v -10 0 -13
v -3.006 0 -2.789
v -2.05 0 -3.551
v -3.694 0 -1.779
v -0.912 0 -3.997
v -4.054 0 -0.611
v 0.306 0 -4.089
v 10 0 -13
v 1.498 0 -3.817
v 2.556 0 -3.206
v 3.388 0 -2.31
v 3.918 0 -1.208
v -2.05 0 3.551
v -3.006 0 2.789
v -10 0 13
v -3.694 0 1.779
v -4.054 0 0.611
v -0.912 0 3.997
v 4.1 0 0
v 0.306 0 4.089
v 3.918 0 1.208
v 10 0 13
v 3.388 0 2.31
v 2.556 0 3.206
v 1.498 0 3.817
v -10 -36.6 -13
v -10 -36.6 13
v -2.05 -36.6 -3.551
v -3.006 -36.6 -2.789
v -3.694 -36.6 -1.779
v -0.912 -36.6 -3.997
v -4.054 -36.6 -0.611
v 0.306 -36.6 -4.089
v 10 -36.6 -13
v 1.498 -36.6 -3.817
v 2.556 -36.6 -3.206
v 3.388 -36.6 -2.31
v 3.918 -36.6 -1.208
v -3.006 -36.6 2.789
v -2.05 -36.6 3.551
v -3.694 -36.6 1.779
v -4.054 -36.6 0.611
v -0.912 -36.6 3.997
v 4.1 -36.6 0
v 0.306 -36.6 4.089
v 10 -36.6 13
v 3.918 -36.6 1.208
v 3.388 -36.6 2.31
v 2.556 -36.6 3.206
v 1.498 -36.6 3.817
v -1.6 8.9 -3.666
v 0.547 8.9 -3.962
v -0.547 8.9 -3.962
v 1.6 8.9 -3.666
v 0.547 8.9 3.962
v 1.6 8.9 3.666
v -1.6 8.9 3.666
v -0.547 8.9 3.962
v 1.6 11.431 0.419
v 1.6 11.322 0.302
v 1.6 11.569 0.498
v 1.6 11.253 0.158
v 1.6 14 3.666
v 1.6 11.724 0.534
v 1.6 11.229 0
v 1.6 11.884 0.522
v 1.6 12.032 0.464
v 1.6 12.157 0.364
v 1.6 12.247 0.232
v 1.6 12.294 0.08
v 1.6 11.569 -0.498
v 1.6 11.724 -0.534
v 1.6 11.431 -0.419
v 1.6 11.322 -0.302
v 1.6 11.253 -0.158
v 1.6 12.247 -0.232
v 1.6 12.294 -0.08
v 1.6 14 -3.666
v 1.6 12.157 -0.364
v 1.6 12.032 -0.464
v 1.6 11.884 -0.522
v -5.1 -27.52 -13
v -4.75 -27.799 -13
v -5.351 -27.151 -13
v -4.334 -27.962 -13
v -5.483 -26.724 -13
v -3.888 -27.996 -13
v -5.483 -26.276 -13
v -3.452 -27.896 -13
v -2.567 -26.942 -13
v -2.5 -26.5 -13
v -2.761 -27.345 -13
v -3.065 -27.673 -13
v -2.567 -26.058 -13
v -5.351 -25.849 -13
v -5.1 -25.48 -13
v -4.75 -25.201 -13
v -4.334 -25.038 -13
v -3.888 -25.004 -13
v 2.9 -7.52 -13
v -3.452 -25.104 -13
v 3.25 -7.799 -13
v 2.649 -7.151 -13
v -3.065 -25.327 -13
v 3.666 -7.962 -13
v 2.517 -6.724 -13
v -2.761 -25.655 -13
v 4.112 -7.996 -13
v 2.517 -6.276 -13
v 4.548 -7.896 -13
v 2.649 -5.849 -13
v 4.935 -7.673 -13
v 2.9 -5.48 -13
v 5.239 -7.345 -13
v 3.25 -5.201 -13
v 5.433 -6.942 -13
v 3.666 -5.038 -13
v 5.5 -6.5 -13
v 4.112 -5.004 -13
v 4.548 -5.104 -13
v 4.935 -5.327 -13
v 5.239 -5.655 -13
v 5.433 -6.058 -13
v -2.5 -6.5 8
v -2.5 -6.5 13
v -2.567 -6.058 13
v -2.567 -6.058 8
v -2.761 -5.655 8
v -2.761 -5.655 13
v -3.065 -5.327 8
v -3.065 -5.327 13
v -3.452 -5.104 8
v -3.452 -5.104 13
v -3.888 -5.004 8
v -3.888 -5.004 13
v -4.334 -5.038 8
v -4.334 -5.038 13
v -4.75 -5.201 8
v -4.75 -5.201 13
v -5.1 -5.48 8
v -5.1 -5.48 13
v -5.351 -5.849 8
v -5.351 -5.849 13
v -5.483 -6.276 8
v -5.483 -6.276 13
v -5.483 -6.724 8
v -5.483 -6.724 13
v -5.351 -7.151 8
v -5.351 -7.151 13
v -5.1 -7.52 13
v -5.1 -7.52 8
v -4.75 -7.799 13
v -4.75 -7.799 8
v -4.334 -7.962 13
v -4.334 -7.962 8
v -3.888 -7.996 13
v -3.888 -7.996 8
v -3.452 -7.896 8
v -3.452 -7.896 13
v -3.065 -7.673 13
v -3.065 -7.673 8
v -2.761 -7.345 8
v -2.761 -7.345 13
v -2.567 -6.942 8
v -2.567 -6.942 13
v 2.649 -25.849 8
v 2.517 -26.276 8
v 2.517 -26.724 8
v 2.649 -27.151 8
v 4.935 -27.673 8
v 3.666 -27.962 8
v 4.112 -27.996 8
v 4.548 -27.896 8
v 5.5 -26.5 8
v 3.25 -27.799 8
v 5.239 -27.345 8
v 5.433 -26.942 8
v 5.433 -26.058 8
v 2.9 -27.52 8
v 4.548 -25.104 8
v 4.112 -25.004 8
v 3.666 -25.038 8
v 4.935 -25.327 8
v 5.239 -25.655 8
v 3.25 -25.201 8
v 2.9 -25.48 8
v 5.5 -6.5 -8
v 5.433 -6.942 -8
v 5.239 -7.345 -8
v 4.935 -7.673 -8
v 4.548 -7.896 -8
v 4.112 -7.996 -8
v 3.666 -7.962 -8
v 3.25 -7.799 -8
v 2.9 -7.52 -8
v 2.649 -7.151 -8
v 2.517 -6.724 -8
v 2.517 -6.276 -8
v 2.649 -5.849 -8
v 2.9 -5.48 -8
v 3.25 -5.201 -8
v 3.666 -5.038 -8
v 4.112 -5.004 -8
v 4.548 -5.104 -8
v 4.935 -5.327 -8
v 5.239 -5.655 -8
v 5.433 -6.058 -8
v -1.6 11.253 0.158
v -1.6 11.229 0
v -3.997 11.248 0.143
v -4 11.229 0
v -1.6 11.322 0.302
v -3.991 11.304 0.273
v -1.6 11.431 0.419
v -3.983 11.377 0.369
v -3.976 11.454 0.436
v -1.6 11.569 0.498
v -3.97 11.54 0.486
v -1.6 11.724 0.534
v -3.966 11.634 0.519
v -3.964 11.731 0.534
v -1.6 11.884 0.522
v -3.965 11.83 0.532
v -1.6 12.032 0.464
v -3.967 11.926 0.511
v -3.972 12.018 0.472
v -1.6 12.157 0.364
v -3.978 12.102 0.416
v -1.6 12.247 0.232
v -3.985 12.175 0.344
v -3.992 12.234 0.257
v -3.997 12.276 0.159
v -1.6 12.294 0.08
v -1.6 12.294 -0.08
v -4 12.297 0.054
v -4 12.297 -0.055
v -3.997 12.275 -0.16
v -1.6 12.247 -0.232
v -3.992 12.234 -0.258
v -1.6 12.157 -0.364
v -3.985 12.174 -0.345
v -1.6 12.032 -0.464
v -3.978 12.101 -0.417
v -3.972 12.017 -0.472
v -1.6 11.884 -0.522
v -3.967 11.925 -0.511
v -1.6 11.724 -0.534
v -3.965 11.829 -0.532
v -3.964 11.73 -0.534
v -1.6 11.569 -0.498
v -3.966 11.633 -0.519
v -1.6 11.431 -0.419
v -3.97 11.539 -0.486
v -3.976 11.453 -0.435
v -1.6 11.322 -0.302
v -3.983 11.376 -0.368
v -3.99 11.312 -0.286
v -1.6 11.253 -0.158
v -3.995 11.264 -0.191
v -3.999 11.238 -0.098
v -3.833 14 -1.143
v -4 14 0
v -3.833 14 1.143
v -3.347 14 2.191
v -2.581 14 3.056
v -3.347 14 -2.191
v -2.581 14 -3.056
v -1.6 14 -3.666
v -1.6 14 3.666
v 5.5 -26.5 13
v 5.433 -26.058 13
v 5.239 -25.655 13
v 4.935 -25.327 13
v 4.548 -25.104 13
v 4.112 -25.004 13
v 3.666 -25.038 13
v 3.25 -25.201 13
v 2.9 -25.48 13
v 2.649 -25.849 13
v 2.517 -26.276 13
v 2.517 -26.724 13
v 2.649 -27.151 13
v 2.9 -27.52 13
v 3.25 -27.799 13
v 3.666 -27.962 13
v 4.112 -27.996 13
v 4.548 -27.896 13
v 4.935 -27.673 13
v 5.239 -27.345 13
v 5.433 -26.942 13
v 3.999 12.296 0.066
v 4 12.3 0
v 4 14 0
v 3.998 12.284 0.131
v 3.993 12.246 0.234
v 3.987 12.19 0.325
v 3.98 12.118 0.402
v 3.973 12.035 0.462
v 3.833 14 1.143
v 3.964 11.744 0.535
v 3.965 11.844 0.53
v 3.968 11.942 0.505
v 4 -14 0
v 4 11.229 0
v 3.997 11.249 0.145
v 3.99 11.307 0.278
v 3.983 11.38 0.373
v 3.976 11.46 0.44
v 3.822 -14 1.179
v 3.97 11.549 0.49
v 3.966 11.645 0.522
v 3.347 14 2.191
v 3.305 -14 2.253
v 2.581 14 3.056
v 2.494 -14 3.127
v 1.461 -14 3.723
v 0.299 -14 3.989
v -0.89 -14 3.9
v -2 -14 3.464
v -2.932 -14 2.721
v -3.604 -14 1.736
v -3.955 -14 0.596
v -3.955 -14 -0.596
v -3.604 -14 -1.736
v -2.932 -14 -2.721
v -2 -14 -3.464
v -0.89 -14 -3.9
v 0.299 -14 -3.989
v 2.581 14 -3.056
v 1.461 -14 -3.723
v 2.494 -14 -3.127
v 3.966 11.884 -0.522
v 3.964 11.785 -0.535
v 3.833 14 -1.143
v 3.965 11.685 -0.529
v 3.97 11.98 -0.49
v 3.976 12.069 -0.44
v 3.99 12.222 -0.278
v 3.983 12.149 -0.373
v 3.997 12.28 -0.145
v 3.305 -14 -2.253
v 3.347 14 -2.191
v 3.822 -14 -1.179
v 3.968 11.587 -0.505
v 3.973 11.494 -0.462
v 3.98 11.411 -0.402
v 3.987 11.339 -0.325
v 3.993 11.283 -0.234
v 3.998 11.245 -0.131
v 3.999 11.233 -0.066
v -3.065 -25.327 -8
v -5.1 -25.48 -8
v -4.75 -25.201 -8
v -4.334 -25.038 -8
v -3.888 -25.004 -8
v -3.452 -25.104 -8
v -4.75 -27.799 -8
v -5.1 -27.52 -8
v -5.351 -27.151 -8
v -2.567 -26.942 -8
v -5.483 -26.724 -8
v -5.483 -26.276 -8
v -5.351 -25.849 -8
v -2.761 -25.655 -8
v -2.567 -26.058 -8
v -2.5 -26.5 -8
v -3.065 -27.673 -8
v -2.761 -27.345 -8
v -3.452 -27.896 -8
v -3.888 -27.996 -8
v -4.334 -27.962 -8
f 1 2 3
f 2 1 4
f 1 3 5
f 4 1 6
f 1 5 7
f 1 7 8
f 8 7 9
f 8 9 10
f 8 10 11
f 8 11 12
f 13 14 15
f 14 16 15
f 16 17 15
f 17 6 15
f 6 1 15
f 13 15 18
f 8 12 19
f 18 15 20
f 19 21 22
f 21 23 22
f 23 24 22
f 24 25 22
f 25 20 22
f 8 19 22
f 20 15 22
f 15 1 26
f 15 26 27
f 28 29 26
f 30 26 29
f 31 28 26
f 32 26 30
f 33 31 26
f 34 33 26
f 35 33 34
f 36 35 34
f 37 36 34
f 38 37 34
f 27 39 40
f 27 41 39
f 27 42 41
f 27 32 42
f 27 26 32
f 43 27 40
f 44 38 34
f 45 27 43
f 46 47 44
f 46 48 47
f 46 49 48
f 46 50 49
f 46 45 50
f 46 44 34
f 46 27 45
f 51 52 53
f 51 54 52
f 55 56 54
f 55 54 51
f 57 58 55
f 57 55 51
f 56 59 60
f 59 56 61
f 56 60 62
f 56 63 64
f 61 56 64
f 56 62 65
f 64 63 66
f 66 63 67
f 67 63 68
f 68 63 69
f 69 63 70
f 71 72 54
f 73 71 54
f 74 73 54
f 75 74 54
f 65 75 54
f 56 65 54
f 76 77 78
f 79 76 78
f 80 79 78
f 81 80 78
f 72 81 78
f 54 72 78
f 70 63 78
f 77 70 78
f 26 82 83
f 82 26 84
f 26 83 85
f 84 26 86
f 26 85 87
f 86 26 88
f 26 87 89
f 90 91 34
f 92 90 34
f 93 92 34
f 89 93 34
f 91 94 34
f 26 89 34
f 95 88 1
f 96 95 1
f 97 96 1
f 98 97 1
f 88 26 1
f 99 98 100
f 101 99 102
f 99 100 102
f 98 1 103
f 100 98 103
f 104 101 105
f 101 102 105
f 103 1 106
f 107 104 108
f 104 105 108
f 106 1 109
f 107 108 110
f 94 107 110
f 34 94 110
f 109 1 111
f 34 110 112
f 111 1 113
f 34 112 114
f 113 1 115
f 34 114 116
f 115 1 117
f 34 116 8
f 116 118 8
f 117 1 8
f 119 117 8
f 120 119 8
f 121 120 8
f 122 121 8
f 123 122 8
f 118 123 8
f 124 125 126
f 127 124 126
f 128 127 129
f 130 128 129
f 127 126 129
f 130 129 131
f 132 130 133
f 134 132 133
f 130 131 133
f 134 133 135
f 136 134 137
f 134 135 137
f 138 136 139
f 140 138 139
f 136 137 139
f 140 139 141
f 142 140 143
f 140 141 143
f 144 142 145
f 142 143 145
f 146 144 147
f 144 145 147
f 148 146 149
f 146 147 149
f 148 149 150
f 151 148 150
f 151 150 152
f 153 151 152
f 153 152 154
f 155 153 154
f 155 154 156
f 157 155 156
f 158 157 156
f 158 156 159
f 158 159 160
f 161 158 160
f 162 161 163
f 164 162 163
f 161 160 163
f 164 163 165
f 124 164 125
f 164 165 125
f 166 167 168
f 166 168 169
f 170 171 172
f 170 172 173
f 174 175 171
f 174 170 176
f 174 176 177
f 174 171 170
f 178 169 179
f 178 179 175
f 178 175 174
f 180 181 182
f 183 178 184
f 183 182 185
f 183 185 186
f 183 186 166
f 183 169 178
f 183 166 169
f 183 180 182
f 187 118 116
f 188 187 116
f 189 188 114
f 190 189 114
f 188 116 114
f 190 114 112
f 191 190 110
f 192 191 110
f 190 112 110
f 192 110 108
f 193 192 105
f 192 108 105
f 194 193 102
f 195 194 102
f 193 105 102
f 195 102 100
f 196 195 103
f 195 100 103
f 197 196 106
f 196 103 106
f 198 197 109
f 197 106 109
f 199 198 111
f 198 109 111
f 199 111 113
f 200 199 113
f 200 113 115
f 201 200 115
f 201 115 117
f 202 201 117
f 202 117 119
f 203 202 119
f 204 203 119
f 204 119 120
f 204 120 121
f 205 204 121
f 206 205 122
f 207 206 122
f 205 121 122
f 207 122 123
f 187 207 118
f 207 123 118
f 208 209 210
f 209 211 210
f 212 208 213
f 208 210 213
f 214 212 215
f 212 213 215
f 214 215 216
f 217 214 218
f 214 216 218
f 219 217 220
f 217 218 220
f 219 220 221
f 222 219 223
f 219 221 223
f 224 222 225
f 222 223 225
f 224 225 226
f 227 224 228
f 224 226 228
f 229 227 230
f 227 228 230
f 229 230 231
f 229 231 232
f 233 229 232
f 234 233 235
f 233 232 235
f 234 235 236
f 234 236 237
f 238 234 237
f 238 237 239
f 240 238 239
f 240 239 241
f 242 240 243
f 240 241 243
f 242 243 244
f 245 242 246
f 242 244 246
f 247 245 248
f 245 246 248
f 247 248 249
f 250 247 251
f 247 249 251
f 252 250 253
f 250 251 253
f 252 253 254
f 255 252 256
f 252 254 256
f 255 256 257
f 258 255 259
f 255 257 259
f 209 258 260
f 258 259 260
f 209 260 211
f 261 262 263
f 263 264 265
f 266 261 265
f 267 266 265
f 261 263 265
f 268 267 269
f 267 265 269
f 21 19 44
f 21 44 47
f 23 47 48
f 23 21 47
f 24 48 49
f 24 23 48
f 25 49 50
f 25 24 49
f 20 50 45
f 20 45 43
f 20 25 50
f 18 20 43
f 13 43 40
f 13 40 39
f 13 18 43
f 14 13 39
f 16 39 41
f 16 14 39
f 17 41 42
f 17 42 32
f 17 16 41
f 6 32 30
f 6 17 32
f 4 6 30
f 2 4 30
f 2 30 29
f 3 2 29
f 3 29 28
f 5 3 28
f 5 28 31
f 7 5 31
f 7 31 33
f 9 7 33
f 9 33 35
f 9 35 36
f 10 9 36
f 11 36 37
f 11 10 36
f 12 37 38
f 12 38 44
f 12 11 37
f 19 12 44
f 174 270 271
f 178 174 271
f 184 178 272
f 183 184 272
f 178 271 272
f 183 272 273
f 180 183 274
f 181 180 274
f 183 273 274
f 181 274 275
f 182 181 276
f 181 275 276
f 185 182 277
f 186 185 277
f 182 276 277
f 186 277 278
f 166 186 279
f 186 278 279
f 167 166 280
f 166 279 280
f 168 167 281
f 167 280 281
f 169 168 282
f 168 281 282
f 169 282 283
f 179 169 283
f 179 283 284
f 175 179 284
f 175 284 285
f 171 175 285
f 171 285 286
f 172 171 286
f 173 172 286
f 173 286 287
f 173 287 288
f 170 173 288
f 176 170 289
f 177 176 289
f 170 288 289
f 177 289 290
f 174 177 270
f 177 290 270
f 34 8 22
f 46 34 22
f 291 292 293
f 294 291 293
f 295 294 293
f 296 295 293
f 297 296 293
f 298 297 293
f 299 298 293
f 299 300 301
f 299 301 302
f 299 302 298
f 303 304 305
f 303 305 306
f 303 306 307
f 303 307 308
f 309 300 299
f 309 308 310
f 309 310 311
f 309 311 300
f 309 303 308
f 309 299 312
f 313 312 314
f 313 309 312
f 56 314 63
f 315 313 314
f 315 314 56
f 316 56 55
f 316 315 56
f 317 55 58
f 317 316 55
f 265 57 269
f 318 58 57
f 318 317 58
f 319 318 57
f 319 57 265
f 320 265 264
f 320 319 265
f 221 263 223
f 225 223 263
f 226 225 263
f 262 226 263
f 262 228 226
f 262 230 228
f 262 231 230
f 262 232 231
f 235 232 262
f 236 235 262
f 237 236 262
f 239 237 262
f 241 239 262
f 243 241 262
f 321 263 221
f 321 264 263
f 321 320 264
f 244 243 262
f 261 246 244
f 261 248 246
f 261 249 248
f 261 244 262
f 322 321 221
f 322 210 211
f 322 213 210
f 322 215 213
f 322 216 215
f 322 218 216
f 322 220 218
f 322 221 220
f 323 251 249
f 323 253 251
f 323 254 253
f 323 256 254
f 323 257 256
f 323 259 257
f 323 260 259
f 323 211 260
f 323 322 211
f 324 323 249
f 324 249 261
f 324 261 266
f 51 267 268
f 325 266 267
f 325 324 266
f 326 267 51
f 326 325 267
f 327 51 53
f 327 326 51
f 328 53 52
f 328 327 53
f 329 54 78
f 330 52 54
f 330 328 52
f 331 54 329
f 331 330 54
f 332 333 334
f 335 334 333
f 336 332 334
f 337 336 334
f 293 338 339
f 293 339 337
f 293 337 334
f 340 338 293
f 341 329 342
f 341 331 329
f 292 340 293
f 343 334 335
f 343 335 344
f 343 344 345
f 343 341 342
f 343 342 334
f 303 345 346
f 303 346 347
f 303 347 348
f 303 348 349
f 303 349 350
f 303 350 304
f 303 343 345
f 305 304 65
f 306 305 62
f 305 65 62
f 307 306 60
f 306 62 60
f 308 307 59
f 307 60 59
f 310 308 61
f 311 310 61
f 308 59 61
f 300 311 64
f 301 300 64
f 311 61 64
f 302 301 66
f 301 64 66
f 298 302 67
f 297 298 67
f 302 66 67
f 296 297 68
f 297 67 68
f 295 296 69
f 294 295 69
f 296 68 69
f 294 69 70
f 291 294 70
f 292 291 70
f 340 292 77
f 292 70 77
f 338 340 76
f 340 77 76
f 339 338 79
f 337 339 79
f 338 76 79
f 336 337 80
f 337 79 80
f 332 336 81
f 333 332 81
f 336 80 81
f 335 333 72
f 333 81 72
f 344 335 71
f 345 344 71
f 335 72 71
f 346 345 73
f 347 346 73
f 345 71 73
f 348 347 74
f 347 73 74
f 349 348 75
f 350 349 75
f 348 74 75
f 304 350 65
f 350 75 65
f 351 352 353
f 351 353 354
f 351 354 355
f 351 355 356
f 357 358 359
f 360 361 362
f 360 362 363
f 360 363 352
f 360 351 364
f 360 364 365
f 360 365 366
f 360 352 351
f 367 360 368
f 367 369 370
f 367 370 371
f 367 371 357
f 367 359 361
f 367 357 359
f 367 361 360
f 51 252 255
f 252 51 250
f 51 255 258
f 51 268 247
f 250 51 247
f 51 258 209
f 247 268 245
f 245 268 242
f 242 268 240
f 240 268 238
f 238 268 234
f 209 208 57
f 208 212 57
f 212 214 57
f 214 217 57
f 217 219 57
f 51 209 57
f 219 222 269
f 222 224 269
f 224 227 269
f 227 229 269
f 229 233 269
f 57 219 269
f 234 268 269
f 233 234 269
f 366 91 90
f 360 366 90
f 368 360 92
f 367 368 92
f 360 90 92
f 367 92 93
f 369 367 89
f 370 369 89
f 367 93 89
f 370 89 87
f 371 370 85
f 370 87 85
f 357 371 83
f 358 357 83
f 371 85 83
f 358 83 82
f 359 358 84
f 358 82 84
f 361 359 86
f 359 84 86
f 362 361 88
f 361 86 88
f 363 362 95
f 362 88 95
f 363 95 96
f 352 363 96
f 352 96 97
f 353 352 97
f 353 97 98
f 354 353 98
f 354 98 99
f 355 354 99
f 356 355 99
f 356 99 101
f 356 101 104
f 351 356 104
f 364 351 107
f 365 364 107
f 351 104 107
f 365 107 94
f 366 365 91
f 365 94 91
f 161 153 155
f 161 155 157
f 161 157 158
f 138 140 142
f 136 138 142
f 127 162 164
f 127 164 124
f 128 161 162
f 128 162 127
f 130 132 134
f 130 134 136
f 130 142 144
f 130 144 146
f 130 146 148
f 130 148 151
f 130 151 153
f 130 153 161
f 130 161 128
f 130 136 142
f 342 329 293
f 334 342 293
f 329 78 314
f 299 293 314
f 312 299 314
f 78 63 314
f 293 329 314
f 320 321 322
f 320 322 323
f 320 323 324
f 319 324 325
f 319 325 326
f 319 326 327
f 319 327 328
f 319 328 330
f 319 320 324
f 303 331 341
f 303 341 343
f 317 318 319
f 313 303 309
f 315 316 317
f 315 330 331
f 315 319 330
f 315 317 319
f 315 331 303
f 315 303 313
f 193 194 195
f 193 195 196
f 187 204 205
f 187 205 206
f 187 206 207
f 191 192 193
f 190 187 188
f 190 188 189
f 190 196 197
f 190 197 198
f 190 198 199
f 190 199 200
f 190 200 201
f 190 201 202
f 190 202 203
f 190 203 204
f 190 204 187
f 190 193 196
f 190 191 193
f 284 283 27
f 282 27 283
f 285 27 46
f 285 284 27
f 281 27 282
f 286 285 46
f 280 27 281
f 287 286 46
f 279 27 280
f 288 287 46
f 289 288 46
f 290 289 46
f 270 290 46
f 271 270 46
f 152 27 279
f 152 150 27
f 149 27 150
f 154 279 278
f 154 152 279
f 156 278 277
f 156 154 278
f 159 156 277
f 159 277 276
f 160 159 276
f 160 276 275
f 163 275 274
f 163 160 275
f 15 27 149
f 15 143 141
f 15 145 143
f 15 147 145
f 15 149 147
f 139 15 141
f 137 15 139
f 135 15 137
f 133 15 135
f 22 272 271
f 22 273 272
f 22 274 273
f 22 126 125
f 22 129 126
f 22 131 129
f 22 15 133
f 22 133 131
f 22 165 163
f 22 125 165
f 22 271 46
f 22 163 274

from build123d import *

# Parameters (mm, degrees)
F0_W      = 20
F0_H      = 26
F0_R      = 4.1
F1_DEPTH  = 36.6
F0_R_2    = 4
F2_DEPTH  = 14
F3_R      = 1.5
F4_DEPTH  = 5
F5_R      = 1.5
F6_DEPTH  = 5
F8_DEPTH  = 5.1
F9_R      = 0.53549
F10_DEPTH = 12.5


with BuildPart() as f1:
    # F0 (on Front) → F1 (new body)
    with BuildSketch(Plane.XZ):
        Rectangle(F0_W, F0_H)
        Circle(F0_R, mode=Mode.SUBTRACT)
    extrude(amount=F1_DEPTH)

    # F3 (on face) → F4 (cut)
    with BuildSketch(Plane.XY.offset(13)):
        with Locations((-4, -6.5)):
            Circle(F3_R)
        with Locations((4, -26.5)):
            Circle(F3_R)
    extrude(amount=-F4_DEPTH, mode=Mode.SUBTRACT)

    # F5 (on face) → F6 (cut)
    with BuildSketch(Plane(origin=(0, 0, -13), x_dir=(1, 0, 0), z_dir=(0, 0, -1))):
        with Locations((-4, 26.5)):
            Circle(F5_R)
        with Locations((4, 6.5)):
            Circle(F5_R)
    extrude(amount=-F6_DEPTH, mode=Mode.SUBTRACT)


with BuildPart() as f2:
    # F0 (on Front) → F2 (new body, symmetric)
    with BuildSketch(Plane.XZ):
        Circle(F0_R_2)
    extrude(amount=F2_DEPTH, both=True)

    # F7 (on face) → F8 (cut)
    with BuildSketch(Plane(origin=(0, 14, 0), x_dir=(-1, 0, 0), z_dir=(0, 1, 0))):
        with BuildLine():
            Line((-1.6, 5), (-1.6, 3.666061))
            ThreePointArc((-1.6, 3.666061), (0, 4), (1.6, 3.666061))
            Line((1.6, 3.666061), (1.6, 5))
            Line((1.6, 5), (-1.6, 5))
        make_face()
        with BuildLine():
            Line((-1.6, 3.666061), (-1.6, -3.666061))
            ThreePointArc((-1.6, -3.666061), (0, -4), (1.6, -3.666061))
            Line((1.6, -3.666061), (1.6, 3.666061))
            ThreePointArc((1.6, 3.666061), (0, 4), (-1.6, 3.666061))
        make_face()
        with BuildLine():
            Line((-1.6, -3.666061), (-1.6, -5))
            Line((-1.6, -5), (1.6, -5))
            Line((1.6, -5), (1.6, -3.666061))
            ThreePointArc((1.6, -3.666061), (0, -4), (-1.6, -3.666061))
        make_face()
    extrude(amount=-F8_DEPTH, mode=Mode.SUBTRACT)

    # F9 (on face) → F10 (cut, symmetric)
    with BuildSketch(Plane(origin=(1.6, 0, 0), x_dir=(0, -1, 0), z_dir=(-1, 0, 0))):
        with Locations((-11.76451, 0)):
            Circle(F9_R)
    extrude(amount=F10_DEPTH, both=True, mode=Mode.SUBTRACT)


solid = Compound([f1.part, f2.part])
